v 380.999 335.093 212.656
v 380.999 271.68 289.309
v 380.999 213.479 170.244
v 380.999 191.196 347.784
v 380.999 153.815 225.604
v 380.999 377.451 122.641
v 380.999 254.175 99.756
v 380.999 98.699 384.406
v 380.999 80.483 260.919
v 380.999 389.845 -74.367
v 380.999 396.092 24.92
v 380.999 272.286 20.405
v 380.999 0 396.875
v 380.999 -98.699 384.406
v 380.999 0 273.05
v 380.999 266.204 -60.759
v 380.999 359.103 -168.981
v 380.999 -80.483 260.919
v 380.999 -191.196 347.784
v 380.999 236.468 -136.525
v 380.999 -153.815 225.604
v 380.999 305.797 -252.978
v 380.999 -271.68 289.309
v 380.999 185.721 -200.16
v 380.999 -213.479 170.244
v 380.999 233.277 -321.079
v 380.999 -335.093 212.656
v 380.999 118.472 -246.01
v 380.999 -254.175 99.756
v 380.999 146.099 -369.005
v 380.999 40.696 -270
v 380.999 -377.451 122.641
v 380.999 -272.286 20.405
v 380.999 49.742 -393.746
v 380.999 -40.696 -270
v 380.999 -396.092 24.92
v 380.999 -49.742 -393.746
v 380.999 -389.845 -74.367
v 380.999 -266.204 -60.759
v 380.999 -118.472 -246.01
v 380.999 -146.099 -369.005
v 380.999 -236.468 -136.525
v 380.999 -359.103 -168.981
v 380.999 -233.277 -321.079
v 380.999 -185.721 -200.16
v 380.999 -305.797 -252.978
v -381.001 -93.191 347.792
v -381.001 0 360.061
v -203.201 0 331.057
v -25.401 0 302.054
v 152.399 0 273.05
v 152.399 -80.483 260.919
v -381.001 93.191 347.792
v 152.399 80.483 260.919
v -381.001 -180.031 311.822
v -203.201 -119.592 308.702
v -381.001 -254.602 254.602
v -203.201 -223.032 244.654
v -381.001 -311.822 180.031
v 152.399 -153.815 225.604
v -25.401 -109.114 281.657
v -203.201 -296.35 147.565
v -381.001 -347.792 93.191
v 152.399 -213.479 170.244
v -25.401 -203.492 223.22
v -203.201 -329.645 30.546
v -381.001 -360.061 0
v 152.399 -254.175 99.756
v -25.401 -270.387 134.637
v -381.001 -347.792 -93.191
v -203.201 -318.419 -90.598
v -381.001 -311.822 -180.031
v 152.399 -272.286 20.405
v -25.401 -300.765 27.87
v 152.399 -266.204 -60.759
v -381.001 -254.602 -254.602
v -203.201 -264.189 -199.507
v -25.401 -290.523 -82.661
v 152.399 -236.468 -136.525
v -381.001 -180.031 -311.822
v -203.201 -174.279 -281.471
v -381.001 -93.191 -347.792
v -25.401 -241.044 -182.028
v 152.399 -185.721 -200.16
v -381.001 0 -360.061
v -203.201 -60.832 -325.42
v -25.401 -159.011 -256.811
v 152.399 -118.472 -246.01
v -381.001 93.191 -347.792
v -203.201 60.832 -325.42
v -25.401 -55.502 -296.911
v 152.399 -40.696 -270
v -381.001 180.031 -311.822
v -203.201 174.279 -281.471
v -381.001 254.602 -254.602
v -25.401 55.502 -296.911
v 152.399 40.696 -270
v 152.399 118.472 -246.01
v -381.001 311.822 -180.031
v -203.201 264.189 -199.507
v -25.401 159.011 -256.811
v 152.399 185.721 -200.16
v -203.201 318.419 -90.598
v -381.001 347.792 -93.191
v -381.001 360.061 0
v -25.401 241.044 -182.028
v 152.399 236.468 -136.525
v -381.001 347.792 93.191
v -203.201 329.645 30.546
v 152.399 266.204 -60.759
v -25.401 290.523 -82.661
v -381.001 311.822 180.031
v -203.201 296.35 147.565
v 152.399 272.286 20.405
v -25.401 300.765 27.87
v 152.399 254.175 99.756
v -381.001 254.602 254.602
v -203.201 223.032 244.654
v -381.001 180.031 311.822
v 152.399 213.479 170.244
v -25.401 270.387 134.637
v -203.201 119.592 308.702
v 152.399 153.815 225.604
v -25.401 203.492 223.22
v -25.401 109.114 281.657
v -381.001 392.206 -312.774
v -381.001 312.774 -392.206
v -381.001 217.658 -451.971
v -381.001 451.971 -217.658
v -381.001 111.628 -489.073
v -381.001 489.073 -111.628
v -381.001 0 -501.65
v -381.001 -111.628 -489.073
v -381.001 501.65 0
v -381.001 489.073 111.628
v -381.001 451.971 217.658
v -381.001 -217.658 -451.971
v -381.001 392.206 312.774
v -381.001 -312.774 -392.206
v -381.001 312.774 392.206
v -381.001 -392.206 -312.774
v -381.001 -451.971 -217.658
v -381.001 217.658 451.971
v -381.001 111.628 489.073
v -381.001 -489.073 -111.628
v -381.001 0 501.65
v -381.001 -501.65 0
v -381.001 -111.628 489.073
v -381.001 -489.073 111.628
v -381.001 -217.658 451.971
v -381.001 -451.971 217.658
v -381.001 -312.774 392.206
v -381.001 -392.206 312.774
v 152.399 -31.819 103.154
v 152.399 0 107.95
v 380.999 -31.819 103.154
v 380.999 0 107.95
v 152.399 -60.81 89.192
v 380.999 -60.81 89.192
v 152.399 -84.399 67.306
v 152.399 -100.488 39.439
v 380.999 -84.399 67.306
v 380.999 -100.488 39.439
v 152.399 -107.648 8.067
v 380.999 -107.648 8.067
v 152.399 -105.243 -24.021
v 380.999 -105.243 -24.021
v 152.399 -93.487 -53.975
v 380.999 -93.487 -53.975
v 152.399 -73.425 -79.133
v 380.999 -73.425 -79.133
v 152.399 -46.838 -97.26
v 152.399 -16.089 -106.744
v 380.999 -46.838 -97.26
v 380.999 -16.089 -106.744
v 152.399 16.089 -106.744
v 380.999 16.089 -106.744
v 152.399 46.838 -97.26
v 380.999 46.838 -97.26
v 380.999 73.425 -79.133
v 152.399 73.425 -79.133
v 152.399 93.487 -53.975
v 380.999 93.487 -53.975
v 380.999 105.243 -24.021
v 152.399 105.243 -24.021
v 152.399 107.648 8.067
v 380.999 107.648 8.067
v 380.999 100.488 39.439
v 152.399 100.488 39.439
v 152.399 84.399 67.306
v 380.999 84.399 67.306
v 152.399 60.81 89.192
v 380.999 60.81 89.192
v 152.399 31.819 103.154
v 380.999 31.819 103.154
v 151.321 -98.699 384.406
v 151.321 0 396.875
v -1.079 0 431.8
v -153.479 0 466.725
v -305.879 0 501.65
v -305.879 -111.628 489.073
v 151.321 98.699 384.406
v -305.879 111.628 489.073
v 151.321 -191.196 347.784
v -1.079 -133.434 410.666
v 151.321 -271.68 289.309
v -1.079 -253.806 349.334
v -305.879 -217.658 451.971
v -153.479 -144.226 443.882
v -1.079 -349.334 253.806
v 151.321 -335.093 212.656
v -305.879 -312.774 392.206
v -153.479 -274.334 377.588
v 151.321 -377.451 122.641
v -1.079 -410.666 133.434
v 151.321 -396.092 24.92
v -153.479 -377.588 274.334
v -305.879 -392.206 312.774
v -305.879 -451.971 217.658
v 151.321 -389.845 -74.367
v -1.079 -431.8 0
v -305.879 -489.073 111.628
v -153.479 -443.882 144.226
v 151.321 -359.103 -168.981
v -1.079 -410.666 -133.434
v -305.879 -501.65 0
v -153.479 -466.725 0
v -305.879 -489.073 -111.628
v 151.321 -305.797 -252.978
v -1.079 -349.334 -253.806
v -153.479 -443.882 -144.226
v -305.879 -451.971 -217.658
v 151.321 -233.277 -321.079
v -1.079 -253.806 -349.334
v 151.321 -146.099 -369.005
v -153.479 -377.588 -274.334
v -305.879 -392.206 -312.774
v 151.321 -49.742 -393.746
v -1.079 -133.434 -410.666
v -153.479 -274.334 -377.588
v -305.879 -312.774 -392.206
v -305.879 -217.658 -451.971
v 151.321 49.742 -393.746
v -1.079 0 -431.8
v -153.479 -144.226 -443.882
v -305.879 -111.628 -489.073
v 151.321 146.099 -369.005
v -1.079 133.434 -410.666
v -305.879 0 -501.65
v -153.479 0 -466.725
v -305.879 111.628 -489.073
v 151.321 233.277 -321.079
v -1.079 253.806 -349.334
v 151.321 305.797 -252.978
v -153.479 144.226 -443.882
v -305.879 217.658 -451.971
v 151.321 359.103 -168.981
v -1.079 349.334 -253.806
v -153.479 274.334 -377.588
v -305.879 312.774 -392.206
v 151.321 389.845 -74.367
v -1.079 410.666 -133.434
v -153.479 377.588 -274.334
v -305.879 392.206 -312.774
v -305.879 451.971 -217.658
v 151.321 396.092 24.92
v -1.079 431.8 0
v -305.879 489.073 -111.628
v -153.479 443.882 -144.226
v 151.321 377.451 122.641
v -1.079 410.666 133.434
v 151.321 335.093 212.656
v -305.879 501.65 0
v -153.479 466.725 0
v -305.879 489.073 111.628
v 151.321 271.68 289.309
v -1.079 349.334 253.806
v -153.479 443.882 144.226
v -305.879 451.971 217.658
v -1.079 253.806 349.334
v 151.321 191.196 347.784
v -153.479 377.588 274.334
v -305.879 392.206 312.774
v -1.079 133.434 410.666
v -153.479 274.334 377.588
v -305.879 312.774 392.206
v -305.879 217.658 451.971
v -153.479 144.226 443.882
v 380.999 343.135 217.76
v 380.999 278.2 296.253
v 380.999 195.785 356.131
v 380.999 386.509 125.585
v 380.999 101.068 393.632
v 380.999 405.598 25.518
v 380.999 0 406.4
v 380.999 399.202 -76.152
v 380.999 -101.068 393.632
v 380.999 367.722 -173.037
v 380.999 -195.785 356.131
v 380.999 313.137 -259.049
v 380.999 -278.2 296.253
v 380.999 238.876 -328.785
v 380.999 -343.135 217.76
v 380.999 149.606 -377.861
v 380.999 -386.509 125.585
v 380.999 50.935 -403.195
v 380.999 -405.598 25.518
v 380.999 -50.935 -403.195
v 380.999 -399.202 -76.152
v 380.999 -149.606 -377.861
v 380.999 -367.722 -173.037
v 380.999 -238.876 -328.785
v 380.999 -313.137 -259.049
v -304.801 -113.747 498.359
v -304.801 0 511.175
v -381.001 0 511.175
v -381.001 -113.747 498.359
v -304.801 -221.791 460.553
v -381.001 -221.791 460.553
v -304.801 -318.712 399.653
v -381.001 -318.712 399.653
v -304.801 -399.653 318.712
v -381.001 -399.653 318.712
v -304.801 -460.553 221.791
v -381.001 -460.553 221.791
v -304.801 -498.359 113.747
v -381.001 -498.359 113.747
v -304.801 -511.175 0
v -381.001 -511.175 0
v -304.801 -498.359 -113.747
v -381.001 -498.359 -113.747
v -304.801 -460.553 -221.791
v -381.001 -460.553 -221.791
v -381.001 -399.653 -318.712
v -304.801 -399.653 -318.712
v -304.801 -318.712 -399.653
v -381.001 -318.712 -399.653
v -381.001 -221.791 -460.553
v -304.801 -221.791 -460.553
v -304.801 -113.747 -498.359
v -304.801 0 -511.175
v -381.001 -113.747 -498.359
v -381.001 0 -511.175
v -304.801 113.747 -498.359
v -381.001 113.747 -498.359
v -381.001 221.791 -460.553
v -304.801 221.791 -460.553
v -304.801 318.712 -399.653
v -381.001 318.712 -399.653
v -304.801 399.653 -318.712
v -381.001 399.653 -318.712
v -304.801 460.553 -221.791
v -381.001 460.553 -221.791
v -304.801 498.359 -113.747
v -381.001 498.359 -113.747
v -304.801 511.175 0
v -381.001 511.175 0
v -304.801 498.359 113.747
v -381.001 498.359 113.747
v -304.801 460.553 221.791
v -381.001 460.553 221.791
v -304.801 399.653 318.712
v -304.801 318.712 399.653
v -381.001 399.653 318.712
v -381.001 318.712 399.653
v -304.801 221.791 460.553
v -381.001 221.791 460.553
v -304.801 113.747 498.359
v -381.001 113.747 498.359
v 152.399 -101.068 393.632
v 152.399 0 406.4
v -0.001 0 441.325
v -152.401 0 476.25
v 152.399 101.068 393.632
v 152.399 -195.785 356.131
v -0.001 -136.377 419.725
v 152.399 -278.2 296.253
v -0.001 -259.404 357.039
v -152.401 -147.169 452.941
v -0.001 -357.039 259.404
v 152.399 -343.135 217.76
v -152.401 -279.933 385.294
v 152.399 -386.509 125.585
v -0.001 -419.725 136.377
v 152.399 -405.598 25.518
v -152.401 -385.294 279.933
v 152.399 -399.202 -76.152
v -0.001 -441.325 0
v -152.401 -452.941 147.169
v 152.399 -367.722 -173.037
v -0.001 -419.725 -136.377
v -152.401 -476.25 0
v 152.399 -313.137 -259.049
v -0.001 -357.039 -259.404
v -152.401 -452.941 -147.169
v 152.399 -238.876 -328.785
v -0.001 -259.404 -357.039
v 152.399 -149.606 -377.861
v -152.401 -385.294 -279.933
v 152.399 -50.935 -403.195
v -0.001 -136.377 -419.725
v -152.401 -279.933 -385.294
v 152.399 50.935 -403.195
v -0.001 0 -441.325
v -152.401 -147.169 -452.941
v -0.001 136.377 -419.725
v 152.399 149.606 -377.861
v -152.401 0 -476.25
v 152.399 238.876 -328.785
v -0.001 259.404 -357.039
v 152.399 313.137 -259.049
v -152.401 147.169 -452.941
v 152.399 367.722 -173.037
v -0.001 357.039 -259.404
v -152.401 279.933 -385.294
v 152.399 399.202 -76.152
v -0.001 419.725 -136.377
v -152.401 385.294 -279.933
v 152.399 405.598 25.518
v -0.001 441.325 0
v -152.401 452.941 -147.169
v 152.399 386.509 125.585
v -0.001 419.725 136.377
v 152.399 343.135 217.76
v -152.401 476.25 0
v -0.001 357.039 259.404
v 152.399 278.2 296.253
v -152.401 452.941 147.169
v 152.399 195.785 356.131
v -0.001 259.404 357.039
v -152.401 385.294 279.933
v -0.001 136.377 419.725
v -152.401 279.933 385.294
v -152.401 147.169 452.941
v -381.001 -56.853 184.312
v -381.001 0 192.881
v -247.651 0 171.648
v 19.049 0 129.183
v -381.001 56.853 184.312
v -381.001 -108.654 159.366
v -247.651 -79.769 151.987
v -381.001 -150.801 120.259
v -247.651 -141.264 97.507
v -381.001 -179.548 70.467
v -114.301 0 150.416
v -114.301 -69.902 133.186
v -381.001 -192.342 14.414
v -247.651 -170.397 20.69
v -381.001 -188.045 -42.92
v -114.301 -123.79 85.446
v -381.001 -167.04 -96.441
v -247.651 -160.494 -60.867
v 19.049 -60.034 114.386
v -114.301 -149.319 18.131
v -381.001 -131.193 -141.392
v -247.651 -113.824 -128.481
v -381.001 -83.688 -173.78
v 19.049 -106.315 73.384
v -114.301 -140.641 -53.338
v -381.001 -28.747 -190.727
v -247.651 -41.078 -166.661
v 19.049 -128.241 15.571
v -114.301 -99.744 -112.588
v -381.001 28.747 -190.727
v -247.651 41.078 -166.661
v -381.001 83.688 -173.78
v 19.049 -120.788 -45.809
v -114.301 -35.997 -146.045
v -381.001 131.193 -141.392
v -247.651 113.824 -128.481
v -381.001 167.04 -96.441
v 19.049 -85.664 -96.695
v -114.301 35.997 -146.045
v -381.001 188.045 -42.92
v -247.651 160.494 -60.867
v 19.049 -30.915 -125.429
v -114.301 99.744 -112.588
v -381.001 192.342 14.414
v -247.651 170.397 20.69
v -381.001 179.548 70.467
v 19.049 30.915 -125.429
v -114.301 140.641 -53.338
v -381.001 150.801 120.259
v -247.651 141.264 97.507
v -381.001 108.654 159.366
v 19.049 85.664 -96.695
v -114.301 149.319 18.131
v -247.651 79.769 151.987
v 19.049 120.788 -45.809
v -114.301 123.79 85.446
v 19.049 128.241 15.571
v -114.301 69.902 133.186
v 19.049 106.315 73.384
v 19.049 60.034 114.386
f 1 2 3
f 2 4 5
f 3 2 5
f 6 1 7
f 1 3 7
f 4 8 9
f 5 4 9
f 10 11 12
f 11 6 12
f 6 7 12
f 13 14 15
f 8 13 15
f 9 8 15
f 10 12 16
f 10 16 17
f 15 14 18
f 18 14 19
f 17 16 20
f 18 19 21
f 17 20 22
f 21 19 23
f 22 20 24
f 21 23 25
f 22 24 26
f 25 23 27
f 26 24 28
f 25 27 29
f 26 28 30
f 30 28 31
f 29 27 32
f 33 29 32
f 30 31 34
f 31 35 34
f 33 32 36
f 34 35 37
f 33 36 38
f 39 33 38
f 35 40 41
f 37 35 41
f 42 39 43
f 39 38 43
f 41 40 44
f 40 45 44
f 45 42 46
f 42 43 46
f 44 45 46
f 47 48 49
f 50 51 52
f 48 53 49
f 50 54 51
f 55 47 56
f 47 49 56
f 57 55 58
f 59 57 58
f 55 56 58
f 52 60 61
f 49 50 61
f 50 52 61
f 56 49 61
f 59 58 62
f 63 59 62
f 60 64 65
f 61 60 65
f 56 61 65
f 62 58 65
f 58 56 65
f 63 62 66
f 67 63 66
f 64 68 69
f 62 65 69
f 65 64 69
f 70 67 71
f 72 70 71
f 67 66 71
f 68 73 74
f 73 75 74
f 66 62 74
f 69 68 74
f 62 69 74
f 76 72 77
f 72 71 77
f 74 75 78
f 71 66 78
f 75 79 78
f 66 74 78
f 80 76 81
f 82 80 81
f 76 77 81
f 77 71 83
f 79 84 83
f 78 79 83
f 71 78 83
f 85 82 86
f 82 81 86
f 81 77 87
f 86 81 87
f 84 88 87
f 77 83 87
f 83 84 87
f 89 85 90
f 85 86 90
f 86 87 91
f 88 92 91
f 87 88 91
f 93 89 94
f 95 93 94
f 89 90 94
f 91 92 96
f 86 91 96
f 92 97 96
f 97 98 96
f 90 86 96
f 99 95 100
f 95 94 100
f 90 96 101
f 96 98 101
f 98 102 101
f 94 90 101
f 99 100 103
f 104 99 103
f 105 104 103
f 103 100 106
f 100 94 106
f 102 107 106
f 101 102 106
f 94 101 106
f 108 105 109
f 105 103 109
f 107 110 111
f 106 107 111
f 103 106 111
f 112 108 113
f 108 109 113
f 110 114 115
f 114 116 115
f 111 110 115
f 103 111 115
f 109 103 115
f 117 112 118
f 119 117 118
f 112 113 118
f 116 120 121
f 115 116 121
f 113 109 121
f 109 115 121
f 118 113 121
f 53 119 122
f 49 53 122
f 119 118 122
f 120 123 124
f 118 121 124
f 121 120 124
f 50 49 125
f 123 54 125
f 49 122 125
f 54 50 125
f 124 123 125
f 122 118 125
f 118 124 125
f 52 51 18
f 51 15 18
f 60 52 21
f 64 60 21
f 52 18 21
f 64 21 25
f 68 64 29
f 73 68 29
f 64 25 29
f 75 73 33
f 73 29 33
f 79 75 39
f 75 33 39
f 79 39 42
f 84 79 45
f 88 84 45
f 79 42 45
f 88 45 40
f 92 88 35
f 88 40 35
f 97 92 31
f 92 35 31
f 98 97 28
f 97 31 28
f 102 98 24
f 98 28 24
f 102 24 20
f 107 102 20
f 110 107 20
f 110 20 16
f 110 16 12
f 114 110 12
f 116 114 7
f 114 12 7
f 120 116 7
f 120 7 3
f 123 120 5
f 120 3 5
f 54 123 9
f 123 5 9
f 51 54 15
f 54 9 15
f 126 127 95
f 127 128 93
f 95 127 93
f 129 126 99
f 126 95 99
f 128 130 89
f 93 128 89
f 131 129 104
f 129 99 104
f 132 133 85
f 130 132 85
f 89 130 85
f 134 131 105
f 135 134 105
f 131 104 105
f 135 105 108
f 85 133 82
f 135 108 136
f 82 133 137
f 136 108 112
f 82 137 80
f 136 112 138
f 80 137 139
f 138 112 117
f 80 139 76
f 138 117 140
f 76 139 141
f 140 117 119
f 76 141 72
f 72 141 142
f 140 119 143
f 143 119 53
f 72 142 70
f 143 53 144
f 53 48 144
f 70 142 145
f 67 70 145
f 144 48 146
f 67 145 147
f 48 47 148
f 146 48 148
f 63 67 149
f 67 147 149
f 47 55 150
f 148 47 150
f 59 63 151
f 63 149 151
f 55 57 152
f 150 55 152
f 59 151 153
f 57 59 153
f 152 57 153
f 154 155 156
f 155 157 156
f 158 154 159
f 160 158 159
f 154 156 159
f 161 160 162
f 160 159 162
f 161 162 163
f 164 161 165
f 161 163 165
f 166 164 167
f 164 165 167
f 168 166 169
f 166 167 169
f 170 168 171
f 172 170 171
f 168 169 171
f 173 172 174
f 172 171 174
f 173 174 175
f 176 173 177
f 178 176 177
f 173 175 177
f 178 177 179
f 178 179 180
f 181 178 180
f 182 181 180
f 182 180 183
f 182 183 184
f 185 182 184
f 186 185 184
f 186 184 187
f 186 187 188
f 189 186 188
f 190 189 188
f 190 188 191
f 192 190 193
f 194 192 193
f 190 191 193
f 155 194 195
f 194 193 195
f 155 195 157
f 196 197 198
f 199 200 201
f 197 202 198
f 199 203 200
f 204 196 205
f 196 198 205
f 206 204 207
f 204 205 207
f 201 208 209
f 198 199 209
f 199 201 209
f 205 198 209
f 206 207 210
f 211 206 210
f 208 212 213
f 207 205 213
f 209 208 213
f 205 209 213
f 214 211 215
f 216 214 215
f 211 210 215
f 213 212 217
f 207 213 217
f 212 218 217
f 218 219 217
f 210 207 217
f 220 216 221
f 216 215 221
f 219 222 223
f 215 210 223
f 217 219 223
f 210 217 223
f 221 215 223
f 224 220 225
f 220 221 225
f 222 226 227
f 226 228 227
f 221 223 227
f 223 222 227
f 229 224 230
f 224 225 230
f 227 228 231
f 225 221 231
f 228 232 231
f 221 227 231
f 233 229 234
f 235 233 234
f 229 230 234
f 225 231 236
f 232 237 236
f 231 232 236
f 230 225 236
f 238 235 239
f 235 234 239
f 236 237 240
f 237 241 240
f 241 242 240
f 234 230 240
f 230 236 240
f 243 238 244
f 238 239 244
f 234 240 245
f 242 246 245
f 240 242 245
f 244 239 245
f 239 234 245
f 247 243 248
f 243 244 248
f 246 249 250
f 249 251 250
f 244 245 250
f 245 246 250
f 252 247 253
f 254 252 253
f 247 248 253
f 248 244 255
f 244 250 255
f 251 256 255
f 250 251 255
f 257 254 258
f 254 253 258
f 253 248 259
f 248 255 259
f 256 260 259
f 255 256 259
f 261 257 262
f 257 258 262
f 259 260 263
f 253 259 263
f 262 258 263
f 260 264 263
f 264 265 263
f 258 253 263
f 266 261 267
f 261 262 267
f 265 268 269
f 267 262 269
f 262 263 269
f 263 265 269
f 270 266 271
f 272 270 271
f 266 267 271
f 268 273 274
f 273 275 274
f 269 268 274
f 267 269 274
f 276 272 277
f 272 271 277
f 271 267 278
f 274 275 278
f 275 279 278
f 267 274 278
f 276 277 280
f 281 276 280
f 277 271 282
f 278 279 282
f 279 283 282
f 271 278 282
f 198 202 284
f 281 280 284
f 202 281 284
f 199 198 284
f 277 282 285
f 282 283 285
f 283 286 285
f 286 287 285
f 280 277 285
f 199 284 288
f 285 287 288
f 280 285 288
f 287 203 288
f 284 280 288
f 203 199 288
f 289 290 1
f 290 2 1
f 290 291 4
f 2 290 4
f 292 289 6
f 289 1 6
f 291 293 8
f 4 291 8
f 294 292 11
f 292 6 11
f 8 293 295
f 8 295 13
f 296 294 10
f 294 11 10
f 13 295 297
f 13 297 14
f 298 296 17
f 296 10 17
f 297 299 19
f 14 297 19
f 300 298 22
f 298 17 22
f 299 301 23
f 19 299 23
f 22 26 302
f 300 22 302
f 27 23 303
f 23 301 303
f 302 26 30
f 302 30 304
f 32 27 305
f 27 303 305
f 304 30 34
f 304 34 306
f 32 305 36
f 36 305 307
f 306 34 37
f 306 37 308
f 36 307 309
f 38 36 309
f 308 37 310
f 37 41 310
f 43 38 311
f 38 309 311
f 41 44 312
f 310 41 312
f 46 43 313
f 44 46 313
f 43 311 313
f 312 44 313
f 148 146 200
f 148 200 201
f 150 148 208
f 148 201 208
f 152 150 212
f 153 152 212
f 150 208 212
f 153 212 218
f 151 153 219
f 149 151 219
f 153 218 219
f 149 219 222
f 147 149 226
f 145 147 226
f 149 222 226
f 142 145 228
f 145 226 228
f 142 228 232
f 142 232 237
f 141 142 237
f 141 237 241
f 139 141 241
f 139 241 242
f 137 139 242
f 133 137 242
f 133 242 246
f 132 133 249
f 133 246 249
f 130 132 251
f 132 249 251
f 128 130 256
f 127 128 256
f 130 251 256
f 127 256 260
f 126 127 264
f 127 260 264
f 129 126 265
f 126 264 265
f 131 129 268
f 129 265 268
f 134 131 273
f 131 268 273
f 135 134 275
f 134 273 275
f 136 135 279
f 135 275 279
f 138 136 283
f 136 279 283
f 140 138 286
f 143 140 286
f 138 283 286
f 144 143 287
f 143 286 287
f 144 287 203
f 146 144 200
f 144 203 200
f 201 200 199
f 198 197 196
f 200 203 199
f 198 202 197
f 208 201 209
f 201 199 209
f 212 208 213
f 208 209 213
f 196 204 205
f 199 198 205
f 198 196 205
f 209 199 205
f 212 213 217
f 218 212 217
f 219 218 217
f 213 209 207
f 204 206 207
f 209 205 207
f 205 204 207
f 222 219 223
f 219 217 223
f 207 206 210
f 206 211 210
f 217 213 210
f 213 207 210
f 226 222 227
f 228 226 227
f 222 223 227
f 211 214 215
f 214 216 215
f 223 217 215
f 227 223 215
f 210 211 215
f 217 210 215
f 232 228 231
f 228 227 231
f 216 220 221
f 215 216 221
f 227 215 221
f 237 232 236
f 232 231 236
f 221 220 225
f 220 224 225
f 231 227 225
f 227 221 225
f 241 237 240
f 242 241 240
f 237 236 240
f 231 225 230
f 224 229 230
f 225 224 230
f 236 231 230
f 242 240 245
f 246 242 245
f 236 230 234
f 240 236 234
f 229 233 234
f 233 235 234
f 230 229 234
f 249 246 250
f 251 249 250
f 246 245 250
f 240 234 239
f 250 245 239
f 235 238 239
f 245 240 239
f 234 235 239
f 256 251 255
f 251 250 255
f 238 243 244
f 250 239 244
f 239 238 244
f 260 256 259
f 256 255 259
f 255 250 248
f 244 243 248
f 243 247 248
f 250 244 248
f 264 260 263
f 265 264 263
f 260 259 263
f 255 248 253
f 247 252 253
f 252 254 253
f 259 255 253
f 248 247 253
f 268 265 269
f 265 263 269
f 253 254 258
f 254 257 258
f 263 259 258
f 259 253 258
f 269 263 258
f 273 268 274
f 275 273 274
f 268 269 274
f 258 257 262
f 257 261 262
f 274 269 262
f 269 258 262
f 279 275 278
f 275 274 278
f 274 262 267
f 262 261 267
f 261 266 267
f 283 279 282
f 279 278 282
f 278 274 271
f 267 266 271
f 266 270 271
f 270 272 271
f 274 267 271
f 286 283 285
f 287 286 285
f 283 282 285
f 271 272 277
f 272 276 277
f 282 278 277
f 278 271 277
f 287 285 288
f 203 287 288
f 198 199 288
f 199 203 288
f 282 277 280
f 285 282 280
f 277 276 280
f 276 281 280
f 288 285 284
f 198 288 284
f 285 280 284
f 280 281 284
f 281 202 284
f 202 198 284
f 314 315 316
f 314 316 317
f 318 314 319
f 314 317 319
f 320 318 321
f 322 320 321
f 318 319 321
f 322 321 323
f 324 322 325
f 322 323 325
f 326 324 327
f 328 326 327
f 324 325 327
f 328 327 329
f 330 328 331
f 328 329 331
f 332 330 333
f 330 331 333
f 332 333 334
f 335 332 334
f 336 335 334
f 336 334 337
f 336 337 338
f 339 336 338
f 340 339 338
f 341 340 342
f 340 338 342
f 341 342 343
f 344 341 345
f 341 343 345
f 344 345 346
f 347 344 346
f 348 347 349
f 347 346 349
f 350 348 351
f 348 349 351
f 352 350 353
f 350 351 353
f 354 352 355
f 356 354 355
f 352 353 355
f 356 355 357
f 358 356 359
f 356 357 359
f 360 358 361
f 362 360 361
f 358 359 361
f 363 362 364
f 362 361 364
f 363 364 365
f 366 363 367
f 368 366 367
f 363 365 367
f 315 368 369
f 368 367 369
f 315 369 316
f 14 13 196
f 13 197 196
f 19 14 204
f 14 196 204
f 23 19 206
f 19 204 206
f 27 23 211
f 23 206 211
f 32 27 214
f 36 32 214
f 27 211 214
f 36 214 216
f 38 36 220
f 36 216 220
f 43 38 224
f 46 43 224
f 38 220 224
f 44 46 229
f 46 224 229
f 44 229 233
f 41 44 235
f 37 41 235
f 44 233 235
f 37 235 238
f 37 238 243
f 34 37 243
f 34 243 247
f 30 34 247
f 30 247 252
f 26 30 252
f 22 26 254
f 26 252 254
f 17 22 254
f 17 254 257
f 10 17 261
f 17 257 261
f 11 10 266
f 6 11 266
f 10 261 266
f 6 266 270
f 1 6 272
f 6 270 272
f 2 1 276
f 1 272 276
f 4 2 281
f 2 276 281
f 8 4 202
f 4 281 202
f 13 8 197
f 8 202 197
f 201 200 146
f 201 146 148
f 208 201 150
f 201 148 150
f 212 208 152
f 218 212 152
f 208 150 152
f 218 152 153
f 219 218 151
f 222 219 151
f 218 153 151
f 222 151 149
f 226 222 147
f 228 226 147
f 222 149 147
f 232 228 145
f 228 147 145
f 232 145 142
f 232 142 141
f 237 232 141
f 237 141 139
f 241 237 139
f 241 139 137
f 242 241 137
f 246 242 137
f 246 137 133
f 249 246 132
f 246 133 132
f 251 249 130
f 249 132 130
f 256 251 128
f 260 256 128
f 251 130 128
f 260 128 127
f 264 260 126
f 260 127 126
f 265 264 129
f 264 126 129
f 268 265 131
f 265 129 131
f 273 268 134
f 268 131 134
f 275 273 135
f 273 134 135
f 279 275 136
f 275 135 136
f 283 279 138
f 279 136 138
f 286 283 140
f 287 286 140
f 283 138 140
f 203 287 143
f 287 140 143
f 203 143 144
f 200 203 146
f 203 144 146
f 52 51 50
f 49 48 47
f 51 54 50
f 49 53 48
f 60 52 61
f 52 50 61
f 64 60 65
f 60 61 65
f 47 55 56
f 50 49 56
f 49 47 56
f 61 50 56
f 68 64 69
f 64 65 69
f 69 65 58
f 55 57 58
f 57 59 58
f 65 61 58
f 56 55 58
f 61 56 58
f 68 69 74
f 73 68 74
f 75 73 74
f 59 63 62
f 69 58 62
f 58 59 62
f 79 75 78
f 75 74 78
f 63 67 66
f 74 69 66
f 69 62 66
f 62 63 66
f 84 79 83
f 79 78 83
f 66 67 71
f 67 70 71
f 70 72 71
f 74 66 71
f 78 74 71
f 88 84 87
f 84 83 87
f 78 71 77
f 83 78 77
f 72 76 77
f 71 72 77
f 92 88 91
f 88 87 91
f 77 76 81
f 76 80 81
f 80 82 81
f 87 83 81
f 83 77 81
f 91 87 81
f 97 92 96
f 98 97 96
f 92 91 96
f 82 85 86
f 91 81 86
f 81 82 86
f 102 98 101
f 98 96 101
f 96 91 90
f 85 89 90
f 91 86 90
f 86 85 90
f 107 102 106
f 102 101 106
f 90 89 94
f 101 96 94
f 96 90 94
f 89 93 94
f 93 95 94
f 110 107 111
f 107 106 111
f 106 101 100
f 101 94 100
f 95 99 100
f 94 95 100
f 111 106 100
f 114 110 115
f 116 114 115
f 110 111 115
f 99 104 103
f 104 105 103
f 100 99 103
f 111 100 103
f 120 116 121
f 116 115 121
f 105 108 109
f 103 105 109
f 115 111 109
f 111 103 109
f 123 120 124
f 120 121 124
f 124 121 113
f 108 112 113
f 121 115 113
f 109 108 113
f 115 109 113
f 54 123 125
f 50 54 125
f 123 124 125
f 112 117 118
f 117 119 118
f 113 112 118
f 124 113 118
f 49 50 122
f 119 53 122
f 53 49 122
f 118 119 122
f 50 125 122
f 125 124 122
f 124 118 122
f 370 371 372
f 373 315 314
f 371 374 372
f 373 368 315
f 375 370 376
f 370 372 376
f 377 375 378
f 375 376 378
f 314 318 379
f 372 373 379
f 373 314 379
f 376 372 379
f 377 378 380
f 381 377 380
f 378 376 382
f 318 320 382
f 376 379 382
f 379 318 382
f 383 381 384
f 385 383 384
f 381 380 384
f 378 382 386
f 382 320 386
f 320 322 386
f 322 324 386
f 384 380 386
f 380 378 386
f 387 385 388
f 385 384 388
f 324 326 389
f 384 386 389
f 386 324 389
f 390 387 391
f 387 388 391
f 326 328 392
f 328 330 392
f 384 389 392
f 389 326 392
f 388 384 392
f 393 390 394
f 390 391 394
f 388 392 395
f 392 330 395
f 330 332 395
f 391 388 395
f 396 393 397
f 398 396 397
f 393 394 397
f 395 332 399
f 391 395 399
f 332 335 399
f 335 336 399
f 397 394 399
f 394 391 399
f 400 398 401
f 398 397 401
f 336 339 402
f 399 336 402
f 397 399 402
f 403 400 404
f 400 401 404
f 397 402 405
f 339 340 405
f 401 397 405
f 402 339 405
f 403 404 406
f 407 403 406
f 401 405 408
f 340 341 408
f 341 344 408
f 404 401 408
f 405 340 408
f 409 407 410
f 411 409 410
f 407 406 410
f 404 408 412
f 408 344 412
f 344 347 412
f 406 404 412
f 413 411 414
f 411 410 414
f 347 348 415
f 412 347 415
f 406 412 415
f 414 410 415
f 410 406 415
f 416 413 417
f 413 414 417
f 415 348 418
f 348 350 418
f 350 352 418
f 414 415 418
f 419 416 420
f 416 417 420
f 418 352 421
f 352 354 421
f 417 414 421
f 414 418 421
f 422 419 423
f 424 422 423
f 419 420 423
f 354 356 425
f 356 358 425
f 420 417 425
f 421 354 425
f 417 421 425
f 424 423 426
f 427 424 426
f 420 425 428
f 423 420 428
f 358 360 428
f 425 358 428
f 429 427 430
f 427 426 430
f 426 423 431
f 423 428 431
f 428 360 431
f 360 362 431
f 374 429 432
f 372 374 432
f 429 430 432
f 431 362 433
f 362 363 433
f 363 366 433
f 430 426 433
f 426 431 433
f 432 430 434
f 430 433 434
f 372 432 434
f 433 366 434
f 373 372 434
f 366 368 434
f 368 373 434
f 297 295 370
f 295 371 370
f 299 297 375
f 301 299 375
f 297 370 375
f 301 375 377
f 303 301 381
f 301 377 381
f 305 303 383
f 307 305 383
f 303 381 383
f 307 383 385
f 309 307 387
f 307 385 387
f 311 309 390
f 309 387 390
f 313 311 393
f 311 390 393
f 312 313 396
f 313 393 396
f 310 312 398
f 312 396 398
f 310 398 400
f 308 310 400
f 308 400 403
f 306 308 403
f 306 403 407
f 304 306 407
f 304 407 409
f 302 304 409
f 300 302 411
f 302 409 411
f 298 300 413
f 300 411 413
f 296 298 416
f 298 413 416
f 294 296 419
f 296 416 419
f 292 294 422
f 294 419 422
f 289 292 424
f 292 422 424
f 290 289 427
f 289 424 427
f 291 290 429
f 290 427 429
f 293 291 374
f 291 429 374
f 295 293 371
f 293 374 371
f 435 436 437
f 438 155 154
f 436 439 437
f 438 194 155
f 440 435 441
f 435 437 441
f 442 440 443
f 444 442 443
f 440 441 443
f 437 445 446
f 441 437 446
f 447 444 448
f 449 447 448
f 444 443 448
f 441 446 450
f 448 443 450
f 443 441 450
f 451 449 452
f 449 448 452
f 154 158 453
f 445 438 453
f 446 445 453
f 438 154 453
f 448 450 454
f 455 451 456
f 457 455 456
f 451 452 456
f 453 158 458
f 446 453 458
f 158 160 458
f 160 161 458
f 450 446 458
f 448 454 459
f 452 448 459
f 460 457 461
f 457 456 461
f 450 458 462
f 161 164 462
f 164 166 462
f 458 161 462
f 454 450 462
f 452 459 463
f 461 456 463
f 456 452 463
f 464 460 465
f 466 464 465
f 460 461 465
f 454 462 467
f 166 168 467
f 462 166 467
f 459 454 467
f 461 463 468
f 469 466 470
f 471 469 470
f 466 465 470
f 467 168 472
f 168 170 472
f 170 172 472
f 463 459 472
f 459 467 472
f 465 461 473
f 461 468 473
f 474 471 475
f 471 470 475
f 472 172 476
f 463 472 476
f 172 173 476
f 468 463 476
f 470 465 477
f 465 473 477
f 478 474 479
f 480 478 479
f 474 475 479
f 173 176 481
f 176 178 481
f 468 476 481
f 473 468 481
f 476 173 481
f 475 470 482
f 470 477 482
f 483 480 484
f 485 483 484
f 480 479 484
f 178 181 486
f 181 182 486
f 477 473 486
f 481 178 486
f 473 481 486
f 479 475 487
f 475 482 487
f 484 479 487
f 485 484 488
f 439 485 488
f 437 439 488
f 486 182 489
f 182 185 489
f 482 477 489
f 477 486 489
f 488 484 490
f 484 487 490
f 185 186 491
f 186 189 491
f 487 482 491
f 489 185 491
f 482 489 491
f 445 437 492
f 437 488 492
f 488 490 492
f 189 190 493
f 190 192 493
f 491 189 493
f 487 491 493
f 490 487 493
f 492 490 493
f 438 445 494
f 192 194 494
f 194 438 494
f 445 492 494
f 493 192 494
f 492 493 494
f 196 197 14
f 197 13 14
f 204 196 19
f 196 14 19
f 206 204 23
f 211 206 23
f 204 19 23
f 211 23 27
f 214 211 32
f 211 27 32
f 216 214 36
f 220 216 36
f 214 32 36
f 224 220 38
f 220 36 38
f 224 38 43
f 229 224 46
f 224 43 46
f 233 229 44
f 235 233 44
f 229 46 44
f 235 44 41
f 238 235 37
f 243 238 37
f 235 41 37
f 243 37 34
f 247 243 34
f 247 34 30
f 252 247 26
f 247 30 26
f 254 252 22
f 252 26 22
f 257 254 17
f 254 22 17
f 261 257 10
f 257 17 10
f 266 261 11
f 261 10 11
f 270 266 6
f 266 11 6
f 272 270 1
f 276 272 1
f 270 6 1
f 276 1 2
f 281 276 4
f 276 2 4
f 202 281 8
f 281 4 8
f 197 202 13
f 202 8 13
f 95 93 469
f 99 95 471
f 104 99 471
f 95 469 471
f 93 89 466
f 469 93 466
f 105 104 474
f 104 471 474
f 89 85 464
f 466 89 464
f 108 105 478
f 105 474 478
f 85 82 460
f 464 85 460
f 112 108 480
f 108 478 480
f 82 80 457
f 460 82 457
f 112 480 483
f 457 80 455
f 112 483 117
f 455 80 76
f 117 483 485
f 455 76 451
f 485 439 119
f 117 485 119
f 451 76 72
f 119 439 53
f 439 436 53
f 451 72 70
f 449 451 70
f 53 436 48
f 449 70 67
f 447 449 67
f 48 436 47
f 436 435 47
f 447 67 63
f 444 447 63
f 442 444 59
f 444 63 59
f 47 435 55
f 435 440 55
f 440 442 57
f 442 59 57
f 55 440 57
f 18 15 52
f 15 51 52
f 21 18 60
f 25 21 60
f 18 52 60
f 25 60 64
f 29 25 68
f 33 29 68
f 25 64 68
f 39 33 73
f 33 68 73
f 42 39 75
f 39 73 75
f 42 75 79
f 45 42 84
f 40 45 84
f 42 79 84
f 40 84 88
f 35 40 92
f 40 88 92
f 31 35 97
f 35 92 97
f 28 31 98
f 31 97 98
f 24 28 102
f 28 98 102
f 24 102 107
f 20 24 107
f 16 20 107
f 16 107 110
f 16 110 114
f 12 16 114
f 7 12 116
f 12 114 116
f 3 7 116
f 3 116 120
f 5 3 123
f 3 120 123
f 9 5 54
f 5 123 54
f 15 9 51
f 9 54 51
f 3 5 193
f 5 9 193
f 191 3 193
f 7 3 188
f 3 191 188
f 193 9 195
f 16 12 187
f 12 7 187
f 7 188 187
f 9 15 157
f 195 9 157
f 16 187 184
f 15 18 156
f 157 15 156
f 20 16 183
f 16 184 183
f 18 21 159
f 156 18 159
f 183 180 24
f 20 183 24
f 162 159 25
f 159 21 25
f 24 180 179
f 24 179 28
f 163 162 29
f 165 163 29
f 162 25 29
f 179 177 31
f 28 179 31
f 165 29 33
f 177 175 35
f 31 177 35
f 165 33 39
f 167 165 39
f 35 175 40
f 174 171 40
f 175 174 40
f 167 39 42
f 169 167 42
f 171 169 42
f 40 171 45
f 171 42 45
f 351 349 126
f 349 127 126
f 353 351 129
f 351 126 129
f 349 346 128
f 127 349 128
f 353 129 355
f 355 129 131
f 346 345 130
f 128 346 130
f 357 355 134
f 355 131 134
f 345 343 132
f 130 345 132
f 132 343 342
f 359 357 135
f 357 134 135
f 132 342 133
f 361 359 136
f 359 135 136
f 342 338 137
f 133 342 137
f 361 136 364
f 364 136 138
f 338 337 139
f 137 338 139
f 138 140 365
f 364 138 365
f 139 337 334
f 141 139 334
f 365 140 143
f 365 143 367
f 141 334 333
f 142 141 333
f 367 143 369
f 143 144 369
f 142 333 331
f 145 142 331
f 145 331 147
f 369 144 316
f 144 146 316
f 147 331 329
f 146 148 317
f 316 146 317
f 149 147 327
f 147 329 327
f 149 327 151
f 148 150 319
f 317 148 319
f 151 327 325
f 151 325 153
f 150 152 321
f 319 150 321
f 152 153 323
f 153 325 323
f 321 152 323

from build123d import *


with BuildPart() as f1:
    # F0 (on Front) → F1 (revolve)
    with BuildSketch(Plane.XZ):
        Polygon((152.398928, 273.05), (-381.001072, 360.061039), (-381.001072, 192.88125), (152.398928, 107.95), (380.998928, 107.95), (380.998928, 273.05), align=None)
    revolve(axis=Axis((-0.001072, 0, 0), (1, 0, 0)))


with BuildPart() as f2:
    # F0 (on Front) → F2 (revolve)
    with BuildSketch(Plane.XZ):
        Polygon((-305.878513, 501.65), (-381.001072, 501.65), (-381.001072, 360.061039), (152.398928, 273.05), (380.998928, 273.05), (380.998928, 396.875), (151.321487, 396.875), align=None)
    revolve(axis=Axis((-0.001072, 0, 0), (1, 0, 0)))


with BuildPart() as f3:
    # F0 (on Front) → F3 (revolve)
    with BuildSketch(Plane.XZ):
        Polygon((-304.801072, 511.175), (-381.001072, 511.175), (-381.001072, 501.65), (-305.878513, 501.65), (151.321487, 396.875), (380.998928, 396.875), (380.998928, 406.4), (152.398928, 406.4), align=None)
    revolve(axis=Axis((-0.001072, 0, 0), (1, 0, 0)))


solid = Compound([f1.part, f2.part, f3.part])
